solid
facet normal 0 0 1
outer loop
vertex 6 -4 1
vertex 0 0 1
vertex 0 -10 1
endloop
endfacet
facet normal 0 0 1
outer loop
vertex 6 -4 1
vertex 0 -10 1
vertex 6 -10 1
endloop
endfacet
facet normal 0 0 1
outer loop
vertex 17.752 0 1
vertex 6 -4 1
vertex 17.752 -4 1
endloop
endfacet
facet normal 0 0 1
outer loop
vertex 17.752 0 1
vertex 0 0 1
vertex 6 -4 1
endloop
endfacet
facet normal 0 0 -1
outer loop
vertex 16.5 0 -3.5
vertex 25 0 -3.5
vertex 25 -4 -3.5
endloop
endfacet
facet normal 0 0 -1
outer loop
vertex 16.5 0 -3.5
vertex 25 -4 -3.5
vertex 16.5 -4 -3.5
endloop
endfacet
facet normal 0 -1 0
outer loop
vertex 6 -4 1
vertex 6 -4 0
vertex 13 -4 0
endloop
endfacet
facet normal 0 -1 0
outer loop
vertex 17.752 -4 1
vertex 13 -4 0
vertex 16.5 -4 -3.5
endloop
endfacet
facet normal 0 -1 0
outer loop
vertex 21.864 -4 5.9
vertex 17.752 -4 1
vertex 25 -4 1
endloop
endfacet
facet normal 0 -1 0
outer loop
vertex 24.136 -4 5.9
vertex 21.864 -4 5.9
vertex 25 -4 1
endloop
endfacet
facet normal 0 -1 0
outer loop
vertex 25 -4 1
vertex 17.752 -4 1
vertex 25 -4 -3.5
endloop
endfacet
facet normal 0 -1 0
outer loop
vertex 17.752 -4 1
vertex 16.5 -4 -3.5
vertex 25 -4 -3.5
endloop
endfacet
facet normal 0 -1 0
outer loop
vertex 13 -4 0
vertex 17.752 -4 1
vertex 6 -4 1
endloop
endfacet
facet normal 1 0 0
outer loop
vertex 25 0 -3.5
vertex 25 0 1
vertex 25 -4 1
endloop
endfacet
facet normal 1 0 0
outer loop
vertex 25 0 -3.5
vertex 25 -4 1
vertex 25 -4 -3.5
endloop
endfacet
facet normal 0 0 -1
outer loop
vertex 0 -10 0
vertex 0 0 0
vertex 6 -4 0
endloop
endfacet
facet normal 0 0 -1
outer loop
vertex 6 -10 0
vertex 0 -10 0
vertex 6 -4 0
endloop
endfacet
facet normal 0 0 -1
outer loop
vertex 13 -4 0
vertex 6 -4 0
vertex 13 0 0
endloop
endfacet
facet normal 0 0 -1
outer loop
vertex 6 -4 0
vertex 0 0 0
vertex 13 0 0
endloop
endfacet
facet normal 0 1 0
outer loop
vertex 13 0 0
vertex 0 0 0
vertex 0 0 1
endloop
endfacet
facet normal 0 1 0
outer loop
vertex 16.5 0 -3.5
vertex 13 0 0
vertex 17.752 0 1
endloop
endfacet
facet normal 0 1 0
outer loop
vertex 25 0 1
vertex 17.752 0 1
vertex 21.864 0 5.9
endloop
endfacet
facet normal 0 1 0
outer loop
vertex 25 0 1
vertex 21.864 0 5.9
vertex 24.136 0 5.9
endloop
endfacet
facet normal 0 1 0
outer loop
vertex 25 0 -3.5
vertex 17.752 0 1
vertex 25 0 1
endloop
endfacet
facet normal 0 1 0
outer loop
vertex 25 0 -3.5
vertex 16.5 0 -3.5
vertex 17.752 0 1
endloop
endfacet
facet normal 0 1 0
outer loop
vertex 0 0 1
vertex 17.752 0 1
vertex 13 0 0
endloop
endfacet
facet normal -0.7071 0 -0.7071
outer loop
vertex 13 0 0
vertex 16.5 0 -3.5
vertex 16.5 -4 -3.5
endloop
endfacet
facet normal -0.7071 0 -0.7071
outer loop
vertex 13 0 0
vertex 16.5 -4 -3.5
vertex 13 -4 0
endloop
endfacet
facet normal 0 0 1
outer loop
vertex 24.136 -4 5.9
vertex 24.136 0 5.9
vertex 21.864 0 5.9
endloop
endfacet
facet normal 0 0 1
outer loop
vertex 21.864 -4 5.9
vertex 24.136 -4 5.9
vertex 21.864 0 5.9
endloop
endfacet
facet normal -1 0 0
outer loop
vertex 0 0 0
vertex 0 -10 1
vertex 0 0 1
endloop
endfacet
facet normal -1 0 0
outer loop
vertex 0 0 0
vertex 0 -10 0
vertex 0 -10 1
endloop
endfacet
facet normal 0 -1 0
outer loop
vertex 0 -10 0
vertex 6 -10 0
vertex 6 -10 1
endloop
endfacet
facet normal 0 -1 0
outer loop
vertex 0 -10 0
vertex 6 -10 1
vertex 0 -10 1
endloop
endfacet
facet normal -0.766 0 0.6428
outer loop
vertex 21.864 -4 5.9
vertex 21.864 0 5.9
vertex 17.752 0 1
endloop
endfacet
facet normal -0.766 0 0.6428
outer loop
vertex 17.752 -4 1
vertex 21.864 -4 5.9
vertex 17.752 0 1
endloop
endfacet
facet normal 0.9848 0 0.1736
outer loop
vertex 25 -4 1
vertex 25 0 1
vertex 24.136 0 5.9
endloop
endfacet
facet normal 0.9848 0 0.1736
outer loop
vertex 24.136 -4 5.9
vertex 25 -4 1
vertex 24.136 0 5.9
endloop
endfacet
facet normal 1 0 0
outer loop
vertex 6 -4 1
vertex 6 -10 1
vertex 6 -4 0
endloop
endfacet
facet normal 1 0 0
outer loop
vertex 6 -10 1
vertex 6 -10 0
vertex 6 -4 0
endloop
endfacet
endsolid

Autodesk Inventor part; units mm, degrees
ref_plane "YZ Plane" through (0, 0, 0) normal (1, 0, 0) x (0, 1, 0)
ref_plane "XZ Plane" through (0, 0, 0) normal (0, 1, 0) x (-1, 0, 0)
ref_plane "XY Plane" through (0, 0, 0) normal (0, 0, 1) x (1, 0, 0)
sketch "草圖1" plane through (0, 0, 0) normal (0, 0, 1) x (1, 0, 0)
  line L0 (0, 0) -> (25, 0)
  line L1 (25, 0) -> (25, -10)
  line L2 (25, -10) -> (0, -10)
  line L3 (0, -10) -> (0, 0)
  line L4 (25, 0) -> (7, 0)
  line L5 (7, 0) -> (7, -4)
  line L6 (7, -4) -> (25, -4)
  line L7 (25, -4) -> (25, 0)
  line L8 (26, -5) -> (6, -5)
  line L9 (6, -5) -> (6, 1)
  line L10 (6, 1) -> (26, 1)
  line L11 (26, 1) -> (26, -5)
  line L12 (7, -4) -> (6, -4)
  line L13 (6, -5) -> (6, -10)
  point P0 (25, -5)
  dimension "d0" = 25
  dimension "d1" = 10
  dimension "d2" = 18
  dimension "d3" = 4
  dimension "d4" = 1
extrude "擠出1" add sketch "草圖1" along normal blind 1 contours L5 L12 L9 L0 | L0 L1 L6 L5 | L9 L13 L2 L3 L0
sketch "草圖2" plane through (0, 0, 0) normal (0, 1, 0) x (1, 0, 0)
  line L0 (25, -1) -> (0, -1) projected
  line L1 (25, -1) -> (24.136, -5.9)
  line L2 (24.136, -5.9) -> (21.864, -5.9)
  line L3 (21.864, -5.9) -> (17.7524, -1)
  point P0 (0, 0)
  point P1 (23, -5.9)
  dimension "d7" = 4.9
  dimension "d8" = 2
  dimension "d9" = 80
  dimension "d10" = 50
extrude "擠出2" add sketch "草圖2" against normal up to surface (4 mm away)
sketch "草圖3" plane through (0, 0, 0) normal (0, 1, 0) x (1, 0, 0)
  line L0 (25, 0) -> (0, 0) projected
  line L1 (0, 0) -> (0, -1) projected
  line L2 (17.7524, -1) -> (0, -1) projected
  line L3 (17.7524, -1) -> (21.864, -5.9) projected
  line L4 (21.864, -5.9) -> (24.136, -5.9) projected
  line L5 (24.136, -5.9) -> (25, -1) projected
  line L6 (25, 0) -> (25, -1) projected
  line L7 (25, 0) -> (25, 3.5)
  line L8 (25, 3.5) -> (16.5, 3.5)
  line L9 (16.5, 3.5) -> (13, 0)
  dimension "d13" = 12
  dimension "d14" = 45
  dimension "d15" = 3.5
extrude "擠出3" add sketch "草圖3" against normal up to surface (4 mm away) contours L0 L9 L8 L7
properties part number "botton_3D 列印"
